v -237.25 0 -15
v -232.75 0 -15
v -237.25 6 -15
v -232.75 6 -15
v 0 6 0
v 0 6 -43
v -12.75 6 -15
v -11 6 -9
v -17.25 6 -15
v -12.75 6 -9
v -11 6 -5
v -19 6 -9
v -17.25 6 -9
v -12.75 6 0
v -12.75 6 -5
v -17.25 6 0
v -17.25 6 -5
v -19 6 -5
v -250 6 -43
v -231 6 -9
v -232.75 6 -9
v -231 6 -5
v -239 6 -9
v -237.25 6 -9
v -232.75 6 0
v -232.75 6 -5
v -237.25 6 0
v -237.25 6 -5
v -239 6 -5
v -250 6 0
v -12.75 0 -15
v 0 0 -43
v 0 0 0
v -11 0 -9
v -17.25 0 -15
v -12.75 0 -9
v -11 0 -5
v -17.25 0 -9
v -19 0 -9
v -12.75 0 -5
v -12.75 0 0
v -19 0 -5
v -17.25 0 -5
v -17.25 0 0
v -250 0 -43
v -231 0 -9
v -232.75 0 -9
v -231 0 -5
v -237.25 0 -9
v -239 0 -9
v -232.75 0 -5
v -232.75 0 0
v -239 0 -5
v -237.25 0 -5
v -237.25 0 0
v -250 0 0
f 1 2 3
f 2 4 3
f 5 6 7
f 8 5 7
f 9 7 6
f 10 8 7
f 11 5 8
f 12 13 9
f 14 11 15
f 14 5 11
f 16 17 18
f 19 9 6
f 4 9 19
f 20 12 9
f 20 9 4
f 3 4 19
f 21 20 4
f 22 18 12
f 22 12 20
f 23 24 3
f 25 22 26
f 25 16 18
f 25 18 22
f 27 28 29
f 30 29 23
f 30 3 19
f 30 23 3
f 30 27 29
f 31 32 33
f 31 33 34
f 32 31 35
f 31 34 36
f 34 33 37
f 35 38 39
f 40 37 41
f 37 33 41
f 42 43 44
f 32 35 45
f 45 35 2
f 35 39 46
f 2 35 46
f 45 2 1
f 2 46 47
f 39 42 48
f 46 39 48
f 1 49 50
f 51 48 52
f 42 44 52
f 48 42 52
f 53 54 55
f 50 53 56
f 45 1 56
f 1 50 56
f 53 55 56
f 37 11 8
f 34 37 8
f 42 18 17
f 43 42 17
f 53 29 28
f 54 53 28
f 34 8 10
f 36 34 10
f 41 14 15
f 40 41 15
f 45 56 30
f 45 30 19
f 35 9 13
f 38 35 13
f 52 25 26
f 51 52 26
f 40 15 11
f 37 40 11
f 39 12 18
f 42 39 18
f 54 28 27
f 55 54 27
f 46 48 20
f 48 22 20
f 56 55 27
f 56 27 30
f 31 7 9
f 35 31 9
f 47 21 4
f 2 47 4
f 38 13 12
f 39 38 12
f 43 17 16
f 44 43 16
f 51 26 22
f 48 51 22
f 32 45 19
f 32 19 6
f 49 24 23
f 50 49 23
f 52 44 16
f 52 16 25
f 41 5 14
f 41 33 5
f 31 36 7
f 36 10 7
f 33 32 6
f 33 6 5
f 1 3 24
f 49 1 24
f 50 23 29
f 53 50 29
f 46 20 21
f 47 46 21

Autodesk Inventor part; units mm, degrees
ref_plane "YZ Plane" through (0, 0, 0) normal (1, 0, 0) x (0, 1, 0)
ref_plane "XZ Plane" through (0, 0, 0) normal (0, 1, 0) x (-1, 0, 0)
ref_plane "XY Plane" through (0, 0, 0) normal (0, 0, 1) x (1, 0, 0)
sketch "Sketch3" plane through (0, 0, 0) normal (0, 1, 0) x (-1, 0, 0)
  line L0 (0, 0) -> (250, 0)
  line L1 (250, 0) -> (250, -43)
  line L2 (250, -43) -> (0, -43)
  line L3 (0, -43) -> (0, 0)
  dimension "d24" = 250
  dimension "d25" = 43
extrude "Extrusion2" add sketch "Sketch3" along normal blind 6
sketch "Sketch4" plane through (0, 6, 0) normal (0, 1, 0) x (1, 0, 0)
  line L0 (-250, 0) -> (0, 0) projected
  line L1 (-17.25, 0) -> (-12.75, 0)
  line L2 (-12.75, 0) -> (-12.75, 15)
  line L3 (-12.75, 15) -> (-17.25, 15)
  line L4 (-17.25, 15) -> (-17.25, 0)
  line L5 (-19, 5) -> (-11, 5)
  line L6 (-11, 5) -> (-11, 9)
  line L7 (-11, 9) -> (-19, 9)
  line L8 (-19, 9) -> (-19, 5)
  line L9 (0, 0) -> (0, 43) projected
  point P0 (-15, 9)
  point P1 (-15, 15)
  dimension "d28" = 4.5
  dimension "d29" = 15
  dimension "d30" = 8
  dimension "d31" = 5
  dimension "d32" = 4
  dimension "d33" = 12.75
extrude "Extrusion3" cut sketch "Sketch4" against normal through all
ref_plane "Work Plane13" through (-125, 0, 0) normal (1, 0, 0) x (0, 0, -1)
mirror "Mirror1" about plane through (-125, 0, 0) normal (1, 0, 0) of "Extrusion3"
properties part number "Selection_Ramp 1_Mid piece" material "Wood (Cherry)"
